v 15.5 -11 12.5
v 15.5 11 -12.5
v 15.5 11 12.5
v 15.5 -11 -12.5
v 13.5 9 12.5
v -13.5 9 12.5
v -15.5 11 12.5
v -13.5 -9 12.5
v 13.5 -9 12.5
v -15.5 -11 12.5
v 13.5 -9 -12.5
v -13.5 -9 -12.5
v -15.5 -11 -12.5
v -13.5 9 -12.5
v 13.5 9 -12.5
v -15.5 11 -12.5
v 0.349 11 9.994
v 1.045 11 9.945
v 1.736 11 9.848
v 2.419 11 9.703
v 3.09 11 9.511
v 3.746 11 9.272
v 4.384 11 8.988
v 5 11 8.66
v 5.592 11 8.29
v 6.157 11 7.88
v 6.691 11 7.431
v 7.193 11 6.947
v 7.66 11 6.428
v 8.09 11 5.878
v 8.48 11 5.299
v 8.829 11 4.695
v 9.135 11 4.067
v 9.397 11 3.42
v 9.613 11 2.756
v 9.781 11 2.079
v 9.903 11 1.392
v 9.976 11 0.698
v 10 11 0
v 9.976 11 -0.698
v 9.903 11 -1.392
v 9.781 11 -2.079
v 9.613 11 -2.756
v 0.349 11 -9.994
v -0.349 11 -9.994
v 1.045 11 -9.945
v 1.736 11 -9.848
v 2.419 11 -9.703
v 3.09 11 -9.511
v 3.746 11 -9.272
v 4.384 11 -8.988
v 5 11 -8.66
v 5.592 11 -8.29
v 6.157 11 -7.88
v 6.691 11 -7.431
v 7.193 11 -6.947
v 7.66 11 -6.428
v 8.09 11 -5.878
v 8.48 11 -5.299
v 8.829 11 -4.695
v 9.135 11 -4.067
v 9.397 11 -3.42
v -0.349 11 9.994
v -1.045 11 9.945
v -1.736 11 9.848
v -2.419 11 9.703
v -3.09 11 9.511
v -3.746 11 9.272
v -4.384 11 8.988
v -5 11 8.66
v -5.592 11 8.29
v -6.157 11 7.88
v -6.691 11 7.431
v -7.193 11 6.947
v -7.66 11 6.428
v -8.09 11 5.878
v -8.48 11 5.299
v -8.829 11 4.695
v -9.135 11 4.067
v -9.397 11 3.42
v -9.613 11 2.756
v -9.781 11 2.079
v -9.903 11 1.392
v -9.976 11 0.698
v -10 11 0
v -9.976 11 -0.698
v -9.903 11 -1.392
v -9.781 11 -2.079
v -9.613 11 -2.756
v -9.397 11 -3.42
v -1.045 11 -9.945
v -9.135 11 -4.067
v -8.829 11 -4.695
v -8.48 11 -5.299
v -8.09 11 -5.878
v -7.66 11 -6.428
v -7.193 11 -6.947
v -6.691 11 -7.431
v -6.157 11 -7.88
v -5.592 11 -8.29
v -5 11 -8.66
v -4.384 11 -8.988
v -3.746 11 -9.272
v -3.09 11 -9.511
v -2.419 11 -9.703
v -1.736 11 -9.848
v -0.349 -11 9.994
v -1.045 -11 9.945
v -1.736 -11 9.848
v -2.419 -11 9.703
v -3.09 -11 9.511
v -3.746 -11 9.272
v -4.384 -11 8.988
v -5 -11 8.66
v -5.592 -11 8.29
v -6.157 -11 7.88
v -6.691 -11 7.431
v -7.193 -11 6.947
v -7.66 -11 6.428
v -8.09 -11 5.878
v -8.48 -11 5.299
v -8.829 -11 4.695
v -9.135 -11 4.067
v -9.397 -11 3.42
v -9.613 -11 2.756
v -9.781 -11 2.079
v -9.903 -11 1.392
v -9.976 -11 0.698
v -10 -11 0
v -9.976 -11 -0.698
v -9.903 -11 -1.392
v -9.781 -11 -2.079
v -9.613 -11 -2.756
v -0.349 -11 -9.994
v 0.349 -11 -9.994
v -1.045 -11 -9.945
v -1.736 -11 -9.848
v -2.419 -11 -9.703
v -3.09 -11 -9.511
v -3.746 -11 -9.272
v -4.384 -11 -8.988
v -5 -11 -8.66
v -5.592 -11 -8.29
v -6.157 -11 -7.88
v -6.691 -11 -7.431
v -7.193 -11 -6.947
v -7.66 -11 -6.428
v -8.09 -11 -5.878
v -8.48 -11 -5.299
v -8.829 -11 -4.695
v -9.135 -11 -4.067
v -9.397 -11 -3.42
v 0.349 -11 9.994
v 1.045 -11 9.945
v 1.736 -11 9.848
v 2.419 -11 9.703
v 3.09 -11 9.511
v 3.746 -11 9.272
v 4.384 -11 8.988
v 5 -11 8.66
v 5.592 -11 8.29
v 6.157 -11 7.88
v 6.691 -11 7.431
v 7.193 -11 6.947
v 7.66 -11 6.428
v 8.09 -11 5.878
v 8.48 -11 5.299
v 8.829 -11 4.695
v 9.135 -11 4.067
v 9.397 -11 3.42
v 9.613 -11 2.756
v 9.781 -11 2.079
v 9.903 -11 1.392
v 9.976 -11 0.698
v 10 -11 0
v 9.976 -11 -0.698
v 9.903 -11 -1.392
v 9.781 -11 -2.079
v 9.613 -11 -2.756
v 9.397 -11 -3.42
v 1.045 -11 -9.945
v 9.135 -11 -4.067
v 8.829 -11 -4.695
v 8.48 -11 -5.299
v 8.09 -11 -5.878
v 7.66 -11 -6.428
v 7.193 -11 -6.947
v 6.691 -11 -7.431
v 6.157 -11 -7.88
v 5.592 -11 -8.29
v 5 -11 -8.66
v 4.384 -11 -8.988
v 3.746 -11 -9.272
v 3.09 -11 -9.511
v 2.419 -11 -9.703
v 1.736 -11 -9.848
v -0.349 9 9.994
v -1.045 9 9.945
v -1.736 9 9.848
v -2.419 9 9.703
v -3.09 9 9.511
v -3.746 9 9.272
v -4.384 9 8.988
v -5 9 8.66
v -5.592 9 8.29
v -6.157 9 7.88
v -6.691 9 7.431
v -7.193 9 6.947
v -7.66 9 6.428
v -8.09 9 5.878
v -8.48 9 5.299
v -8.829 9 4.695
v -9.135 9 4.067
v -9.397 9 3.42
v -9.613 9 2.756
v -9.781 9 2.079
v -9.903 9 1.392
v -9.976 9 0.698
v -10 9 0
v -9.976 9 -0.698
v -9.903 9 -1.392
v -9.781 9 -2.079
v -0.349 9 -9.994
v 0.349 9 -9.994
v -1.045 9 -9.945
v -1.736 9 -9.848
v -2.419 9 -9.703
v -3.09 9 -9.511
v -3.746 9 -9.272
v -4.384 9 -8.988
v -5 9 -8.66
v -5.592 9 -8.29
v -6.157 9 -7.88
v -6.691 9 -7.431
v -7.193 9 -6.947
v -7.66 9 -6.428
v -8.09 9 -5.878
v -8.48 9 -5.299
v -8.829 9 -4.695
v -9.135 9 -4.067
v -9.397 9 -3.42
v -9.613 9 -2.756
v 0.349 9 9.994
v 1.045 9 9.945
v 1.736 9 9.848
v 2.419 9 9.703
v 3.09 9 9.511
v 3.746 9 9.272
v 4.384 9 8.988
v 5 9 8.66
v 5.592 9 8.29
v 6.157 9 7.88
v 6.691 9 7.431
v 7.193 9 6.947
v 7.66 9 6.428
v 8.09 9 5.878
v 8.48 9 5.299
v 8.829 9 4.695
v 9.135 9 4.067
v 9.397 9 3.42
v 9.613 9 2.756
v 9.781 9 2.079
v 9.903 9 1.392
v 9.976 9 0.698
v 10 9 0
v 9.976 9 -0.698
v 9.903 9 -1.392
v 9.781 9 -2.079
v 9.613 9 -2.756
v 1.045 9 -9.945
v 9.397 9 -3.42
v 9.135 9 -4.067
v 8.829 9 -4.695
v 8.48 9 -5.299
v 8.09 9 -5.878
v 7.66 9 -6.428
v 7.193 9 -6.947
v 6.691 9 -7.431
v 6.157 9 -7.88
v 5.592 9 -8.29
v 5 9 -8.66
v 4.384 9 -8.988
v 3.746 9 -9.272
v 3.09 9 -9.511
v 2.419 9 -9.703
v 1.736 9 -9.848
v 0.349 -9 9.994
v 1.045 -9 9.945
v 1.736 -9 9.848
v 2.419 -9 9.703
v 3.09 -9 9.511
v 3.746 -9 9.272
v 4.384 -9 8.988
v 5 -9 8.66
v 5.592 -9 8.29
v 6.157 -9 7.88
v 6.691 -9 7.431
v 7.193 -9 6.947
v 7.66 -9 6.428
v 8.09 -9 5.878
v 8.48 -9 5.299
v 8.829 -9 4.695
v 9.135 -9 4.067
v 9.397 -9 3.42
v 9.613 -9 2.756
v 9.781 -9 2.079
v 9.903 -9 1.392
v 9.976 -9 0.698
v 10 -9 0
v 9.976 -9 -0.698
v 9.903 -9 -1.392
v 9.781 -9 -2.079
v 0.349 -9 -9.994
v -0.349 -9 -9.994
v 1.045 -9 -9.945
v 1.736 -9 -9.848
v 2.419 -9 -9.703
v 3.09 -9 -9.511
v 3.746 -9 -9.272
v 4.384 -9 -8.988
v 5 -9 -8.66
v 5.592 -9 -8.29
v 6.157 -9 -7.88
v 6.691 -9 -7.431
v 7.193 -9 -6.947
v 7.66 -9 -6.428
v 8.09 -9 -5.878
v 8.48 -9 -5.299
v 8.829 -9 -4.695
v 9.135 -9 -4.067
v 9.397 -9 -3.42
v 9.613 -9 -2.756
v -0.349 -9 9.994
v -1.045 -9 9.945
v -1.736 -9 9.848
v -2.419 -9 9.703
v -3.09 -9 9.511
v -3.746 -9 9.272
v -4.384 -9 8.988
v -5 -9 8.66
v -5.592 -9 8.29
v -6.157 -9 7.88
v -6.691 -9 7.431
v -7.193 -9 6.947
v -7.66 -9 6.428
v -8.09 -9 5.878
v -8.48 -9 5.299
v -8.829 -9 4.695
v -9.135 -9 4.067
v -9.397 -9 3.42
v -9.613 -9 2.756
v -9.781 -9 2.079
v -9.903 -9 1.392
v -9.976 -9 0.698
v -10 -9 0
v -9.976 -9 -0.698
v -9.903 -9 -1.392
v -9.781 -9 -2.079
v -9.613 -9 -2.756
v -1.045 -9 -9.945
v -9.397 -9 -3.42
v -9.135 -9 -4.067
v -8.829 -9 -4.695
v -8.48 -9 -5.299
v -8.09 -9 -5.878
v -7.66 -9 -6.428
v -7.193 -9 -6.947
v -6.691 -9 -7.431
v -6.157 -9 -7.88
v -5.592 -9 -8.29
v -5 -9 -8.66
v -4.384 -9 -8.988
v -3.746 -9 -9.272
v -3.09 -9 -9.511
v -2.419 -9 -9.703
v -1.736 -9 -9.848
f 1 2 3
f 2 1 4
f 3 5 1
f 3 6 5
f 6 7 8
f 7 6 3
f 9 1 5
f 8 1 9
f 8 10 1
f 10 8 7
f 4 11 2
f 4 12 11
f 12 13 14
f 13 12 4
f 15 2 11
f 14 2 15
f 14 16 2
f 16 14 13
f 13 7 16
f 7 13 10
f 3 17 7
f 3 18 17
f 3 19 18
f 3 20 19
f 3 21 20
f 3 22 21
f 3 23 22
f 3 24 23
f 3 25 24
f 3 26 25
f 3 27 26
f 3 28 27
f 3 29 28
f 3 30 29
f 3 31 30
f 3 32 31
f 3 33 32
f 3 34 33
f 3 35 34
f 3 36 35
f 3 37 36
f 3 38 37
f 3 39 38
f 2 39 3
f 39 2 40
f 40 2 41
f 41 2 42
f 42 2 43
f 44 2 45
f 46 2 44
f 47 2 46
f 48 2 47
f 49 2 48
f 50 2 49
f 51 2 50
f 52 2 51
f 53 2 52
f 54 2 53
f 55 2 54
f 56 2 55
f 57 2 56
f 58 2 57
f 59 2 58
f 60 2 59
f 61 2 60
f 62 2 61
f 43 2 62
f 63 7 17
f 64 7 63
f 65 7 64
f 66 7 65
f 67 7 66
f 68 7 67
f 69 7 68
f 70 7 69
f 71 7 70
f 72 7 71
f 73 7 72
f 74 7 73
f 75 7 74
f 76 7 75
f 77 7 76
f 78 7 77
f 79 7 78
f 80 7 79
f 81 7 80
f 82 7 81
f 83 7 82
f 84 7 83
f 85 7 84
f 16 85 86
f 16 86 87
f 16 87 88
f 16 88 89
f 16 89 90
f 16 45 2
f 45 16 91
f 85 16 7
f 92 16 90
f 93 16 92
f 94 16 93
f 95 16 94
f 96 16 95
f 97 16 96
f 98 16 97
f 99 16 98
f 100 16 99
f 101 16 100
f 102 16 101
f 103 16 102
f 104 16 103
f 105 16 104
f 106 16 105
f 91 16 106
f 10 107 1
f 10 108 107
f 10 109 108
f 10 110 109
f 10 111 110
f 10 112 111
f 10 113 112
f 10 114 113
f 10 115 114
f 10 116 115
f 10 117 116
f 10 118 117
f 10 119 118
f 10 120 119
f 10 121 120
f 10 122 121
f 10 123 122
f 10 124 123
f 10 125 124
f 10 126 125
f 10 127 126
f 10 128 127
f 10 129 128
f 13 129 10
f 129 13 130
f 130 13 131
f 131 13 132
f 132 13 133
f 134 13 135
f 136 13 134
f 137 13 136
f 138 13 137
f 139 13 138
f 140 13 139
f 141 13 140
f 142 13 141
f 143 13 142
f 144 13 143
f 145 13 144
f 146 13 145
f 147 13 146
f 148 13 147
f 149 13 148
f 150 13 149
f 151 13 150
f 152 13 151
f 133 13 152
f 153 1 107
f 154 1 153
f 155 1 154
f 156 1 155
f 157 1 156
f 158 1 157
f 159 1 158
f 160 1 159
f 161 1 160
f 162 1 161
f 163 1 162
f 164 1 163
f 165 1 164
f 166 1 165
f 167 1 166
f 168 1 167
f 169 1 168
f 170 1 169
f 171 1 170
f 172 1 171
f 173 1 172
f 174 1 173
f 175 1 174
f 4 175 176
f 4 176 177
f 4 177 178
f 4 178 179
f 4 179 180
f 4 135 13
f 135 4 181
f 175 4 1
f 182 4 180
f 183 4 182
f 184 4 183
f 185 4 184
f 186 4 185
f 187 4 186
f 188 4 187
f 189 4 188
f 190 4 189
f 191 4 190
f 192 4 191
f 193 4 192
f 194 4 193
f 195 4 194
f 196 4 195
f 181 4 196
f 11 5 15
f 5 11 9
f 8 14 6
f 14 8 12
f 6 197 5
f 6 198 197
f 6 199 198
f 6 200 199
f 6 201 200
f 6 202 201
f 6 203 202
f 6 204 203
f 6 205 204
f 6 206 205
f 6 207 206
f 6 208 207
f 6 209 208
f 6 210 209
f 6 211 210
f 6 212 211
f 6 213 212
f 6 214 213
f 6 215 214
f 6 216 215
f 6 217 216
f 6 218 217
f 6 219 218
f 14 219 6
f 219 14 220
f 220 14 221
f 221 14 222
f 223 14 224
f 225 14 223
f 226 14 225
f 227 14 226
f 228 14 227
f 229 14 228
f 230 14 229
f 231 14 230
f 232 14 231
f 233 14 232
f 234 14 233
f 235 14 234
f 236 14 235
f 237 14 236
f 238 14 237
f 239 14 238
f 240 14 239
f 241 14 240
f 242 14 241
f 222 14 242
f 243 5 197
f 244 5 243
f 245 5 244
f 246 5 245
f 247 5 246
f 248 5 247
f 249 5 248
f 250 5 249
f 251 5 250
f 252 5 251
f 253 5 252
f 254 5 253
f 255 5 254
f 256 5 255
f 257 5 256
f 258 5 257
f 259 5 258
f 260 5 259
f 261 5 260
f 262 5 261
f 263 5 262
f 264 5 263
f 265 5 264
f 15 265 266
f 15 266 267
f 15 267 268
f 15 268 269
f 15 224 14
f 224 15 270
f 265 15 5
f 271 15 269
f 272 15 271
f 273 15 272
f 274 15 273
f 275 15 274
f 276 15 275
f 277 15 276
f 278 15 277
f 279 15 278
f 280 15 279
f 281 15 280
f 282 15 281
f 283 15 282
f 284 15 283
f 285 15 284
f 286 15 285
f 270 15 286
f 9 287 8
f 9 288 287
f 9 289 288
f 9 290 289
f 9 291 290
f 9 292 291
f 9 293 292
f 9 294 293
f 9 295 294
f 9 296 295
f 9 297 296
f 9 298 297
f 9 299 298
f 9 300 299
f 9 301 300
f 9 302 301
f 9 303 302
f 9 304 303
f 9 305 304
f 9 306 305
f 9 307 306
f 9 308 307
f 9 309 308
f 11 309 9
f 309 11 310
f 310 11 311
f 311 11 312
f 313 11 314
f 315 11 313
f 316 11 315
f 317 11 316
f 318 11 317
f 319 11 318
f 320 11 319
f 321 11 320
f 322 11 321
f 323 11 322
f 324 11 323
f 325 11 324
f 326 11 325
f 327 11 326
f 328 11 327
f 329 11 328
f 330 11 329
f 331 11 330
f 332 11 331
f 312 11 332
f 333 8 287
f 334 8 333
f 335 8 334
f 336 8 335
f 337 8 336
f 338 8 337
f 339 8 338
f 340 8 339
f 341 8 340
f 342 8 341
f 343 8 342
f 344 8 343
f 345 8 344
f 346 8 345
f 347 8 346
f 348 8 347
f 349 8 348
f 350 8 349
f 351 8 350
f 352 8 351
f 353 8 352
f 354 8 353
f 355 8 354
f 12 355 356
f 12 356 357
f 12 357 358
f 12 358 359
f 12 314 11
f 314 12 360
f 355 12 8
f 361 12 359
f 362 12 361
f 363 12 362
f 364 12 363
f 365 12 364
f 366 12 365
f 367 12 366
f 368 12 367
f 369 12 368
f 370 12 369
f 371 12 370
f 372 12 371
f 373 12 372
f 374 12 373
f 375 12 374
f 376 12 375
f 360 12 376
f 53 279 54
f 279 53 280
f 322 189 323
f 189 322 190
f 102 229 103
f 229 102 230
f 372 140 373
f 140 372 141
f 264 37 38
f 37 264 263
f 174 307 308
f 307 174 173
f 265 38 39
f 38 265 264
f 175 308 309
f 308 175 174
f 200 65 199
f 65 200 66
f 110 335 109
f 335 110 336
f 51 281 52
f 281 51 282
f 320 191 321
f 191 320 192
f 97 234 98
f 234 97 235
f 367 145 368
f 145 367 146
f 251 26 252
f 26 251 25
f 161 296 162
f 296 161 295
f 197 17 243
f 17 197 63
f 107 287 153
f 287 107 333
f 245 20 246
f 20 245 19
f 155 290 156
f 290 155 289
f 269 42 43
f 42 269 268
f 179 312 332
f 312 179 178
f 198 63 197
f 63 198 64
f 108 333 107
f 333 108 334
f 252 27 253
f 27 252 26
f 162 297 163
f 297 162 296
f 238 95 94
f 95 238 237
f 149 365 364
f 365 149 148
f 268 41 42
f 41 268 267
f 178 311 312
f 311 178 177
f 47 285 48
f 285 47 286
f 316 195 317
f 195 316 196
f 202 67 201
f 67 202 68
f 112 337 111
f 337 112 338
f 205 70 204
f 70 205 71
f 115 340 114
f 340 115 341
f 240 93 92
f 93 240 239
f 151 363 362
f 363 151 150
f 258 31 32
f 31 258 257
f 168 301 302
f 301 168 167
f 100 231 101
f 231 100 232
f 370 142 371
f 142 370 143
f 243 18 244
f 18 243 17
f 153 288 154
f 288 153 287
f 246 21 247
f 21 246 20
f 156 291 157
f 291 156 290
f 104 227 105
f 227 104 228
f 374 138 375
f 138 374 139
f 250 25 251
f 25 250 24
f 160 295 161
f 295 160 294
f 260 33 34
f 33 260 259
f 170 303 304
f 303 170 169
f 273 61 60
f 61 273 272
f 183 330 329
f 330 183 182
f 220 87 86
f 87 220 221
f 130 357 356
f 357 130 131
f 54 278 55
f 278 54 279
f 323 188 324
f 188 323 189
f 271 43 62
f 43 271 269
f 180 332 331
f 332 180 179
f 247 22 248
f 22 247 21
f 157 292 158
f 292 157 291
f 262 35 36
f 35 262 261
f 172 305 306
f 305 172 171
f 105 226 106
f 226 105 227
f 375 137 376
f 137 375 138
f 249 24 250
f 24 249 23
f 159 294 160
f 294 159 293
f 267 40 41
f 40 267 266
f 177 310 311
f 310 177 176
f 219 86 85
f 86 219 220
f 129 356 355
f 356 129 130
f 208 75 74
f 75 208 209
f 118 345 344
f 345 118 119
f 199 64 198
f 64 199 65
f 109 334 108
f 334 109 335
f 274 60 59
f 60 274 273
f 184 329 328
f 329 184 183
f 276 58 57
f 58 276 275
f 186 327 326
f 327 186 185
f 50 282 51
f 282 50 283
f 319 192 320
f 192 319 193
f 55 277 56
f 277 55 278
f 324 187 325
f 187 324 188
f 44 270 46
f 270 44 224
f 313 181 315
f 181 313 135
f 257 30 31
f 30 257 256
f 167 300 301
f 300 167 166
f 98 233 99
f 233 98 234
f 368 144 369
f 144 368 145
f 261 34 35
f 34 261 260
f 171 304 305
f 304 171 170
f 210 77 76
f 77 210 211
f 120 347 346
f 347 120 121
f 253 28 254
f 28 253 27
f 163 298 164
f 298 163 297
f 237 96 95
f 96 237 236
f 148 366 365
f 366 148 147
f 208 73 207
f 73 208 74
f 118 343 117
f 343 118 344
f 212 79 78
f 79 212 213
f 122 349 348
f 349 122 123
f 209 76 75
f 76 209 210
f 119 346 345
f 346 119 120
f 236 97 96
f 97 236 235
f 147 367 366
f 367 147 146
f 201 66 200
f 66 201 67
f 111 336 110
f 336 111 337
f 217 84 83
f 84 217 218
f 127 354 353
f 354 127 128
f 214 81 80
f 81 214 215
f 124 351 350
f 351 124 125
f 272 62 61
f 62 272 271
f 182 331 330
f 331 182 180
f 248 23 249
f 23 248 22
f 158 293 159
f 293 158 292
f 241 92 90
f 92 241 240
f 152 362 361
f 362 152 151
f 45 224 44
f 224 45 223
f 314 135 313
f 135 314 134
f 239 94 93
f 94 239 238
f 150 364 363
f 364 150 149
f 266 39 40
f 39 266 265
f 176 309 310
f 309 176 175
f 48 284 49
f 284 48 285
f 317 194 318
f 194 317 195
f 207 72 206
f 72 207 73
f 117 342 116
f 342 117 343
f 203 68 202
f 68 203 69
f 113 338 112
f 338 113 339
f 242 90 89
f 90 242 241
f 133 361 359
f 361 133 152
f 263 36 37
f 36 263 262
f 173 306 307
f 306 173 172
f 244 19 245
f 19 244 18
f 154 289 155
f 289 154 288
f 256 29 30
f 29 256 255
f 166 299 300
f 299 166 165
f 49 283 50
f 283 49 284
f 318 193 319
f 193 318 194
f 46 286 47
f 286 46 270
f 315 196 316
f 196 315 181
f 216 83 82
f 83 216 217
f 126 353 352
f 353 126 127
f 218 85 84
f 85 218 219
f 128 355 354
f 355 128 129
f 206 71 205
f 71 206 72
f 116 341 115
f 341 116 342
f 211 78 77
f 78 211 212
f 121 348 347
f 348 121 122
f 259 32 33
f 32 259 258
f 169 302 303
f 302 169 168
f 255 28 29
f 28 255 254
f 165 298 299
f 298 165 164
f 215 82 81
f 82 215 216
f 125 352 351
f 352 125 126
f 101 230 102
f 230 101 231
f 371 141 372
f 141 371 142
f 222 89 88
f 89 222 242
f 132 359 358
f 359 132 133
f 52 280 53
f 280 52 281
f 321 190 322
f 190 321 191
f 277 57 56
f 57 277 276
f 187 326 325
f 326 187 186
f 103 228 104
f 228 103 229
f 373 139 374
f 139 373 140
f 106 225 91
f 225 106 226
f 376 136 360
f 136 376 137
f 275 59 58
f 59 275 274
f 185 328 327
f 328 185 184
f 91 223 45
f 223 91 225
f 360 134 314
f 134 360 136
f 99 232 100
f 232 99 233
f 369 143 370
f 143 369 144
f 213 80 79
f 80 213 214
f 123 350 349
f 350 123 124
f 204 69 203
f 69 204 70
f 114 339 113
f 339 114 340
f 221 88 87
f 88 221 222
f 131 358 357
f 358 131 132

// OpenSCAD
$fa=4; // default minimum facet angle is now 4
$fs=0.05; // default minimum facet size is now 0.05 mm

batteryWidth = 27;
batteryHeight = 18;
batteryDepth = 50;
wallThickness = 2;

difference() {
  cube([batteryWidth + wallThickness * 2, batteryHeight + wallThickness * 2, 25], center=true);
  translate([0, 0, -.5]) cube([batteryWidth, batteryHeight, 26], center=true);
  rotate([90, 0, 0]) cylinder(r = 10, h = 100, center=true);
}
